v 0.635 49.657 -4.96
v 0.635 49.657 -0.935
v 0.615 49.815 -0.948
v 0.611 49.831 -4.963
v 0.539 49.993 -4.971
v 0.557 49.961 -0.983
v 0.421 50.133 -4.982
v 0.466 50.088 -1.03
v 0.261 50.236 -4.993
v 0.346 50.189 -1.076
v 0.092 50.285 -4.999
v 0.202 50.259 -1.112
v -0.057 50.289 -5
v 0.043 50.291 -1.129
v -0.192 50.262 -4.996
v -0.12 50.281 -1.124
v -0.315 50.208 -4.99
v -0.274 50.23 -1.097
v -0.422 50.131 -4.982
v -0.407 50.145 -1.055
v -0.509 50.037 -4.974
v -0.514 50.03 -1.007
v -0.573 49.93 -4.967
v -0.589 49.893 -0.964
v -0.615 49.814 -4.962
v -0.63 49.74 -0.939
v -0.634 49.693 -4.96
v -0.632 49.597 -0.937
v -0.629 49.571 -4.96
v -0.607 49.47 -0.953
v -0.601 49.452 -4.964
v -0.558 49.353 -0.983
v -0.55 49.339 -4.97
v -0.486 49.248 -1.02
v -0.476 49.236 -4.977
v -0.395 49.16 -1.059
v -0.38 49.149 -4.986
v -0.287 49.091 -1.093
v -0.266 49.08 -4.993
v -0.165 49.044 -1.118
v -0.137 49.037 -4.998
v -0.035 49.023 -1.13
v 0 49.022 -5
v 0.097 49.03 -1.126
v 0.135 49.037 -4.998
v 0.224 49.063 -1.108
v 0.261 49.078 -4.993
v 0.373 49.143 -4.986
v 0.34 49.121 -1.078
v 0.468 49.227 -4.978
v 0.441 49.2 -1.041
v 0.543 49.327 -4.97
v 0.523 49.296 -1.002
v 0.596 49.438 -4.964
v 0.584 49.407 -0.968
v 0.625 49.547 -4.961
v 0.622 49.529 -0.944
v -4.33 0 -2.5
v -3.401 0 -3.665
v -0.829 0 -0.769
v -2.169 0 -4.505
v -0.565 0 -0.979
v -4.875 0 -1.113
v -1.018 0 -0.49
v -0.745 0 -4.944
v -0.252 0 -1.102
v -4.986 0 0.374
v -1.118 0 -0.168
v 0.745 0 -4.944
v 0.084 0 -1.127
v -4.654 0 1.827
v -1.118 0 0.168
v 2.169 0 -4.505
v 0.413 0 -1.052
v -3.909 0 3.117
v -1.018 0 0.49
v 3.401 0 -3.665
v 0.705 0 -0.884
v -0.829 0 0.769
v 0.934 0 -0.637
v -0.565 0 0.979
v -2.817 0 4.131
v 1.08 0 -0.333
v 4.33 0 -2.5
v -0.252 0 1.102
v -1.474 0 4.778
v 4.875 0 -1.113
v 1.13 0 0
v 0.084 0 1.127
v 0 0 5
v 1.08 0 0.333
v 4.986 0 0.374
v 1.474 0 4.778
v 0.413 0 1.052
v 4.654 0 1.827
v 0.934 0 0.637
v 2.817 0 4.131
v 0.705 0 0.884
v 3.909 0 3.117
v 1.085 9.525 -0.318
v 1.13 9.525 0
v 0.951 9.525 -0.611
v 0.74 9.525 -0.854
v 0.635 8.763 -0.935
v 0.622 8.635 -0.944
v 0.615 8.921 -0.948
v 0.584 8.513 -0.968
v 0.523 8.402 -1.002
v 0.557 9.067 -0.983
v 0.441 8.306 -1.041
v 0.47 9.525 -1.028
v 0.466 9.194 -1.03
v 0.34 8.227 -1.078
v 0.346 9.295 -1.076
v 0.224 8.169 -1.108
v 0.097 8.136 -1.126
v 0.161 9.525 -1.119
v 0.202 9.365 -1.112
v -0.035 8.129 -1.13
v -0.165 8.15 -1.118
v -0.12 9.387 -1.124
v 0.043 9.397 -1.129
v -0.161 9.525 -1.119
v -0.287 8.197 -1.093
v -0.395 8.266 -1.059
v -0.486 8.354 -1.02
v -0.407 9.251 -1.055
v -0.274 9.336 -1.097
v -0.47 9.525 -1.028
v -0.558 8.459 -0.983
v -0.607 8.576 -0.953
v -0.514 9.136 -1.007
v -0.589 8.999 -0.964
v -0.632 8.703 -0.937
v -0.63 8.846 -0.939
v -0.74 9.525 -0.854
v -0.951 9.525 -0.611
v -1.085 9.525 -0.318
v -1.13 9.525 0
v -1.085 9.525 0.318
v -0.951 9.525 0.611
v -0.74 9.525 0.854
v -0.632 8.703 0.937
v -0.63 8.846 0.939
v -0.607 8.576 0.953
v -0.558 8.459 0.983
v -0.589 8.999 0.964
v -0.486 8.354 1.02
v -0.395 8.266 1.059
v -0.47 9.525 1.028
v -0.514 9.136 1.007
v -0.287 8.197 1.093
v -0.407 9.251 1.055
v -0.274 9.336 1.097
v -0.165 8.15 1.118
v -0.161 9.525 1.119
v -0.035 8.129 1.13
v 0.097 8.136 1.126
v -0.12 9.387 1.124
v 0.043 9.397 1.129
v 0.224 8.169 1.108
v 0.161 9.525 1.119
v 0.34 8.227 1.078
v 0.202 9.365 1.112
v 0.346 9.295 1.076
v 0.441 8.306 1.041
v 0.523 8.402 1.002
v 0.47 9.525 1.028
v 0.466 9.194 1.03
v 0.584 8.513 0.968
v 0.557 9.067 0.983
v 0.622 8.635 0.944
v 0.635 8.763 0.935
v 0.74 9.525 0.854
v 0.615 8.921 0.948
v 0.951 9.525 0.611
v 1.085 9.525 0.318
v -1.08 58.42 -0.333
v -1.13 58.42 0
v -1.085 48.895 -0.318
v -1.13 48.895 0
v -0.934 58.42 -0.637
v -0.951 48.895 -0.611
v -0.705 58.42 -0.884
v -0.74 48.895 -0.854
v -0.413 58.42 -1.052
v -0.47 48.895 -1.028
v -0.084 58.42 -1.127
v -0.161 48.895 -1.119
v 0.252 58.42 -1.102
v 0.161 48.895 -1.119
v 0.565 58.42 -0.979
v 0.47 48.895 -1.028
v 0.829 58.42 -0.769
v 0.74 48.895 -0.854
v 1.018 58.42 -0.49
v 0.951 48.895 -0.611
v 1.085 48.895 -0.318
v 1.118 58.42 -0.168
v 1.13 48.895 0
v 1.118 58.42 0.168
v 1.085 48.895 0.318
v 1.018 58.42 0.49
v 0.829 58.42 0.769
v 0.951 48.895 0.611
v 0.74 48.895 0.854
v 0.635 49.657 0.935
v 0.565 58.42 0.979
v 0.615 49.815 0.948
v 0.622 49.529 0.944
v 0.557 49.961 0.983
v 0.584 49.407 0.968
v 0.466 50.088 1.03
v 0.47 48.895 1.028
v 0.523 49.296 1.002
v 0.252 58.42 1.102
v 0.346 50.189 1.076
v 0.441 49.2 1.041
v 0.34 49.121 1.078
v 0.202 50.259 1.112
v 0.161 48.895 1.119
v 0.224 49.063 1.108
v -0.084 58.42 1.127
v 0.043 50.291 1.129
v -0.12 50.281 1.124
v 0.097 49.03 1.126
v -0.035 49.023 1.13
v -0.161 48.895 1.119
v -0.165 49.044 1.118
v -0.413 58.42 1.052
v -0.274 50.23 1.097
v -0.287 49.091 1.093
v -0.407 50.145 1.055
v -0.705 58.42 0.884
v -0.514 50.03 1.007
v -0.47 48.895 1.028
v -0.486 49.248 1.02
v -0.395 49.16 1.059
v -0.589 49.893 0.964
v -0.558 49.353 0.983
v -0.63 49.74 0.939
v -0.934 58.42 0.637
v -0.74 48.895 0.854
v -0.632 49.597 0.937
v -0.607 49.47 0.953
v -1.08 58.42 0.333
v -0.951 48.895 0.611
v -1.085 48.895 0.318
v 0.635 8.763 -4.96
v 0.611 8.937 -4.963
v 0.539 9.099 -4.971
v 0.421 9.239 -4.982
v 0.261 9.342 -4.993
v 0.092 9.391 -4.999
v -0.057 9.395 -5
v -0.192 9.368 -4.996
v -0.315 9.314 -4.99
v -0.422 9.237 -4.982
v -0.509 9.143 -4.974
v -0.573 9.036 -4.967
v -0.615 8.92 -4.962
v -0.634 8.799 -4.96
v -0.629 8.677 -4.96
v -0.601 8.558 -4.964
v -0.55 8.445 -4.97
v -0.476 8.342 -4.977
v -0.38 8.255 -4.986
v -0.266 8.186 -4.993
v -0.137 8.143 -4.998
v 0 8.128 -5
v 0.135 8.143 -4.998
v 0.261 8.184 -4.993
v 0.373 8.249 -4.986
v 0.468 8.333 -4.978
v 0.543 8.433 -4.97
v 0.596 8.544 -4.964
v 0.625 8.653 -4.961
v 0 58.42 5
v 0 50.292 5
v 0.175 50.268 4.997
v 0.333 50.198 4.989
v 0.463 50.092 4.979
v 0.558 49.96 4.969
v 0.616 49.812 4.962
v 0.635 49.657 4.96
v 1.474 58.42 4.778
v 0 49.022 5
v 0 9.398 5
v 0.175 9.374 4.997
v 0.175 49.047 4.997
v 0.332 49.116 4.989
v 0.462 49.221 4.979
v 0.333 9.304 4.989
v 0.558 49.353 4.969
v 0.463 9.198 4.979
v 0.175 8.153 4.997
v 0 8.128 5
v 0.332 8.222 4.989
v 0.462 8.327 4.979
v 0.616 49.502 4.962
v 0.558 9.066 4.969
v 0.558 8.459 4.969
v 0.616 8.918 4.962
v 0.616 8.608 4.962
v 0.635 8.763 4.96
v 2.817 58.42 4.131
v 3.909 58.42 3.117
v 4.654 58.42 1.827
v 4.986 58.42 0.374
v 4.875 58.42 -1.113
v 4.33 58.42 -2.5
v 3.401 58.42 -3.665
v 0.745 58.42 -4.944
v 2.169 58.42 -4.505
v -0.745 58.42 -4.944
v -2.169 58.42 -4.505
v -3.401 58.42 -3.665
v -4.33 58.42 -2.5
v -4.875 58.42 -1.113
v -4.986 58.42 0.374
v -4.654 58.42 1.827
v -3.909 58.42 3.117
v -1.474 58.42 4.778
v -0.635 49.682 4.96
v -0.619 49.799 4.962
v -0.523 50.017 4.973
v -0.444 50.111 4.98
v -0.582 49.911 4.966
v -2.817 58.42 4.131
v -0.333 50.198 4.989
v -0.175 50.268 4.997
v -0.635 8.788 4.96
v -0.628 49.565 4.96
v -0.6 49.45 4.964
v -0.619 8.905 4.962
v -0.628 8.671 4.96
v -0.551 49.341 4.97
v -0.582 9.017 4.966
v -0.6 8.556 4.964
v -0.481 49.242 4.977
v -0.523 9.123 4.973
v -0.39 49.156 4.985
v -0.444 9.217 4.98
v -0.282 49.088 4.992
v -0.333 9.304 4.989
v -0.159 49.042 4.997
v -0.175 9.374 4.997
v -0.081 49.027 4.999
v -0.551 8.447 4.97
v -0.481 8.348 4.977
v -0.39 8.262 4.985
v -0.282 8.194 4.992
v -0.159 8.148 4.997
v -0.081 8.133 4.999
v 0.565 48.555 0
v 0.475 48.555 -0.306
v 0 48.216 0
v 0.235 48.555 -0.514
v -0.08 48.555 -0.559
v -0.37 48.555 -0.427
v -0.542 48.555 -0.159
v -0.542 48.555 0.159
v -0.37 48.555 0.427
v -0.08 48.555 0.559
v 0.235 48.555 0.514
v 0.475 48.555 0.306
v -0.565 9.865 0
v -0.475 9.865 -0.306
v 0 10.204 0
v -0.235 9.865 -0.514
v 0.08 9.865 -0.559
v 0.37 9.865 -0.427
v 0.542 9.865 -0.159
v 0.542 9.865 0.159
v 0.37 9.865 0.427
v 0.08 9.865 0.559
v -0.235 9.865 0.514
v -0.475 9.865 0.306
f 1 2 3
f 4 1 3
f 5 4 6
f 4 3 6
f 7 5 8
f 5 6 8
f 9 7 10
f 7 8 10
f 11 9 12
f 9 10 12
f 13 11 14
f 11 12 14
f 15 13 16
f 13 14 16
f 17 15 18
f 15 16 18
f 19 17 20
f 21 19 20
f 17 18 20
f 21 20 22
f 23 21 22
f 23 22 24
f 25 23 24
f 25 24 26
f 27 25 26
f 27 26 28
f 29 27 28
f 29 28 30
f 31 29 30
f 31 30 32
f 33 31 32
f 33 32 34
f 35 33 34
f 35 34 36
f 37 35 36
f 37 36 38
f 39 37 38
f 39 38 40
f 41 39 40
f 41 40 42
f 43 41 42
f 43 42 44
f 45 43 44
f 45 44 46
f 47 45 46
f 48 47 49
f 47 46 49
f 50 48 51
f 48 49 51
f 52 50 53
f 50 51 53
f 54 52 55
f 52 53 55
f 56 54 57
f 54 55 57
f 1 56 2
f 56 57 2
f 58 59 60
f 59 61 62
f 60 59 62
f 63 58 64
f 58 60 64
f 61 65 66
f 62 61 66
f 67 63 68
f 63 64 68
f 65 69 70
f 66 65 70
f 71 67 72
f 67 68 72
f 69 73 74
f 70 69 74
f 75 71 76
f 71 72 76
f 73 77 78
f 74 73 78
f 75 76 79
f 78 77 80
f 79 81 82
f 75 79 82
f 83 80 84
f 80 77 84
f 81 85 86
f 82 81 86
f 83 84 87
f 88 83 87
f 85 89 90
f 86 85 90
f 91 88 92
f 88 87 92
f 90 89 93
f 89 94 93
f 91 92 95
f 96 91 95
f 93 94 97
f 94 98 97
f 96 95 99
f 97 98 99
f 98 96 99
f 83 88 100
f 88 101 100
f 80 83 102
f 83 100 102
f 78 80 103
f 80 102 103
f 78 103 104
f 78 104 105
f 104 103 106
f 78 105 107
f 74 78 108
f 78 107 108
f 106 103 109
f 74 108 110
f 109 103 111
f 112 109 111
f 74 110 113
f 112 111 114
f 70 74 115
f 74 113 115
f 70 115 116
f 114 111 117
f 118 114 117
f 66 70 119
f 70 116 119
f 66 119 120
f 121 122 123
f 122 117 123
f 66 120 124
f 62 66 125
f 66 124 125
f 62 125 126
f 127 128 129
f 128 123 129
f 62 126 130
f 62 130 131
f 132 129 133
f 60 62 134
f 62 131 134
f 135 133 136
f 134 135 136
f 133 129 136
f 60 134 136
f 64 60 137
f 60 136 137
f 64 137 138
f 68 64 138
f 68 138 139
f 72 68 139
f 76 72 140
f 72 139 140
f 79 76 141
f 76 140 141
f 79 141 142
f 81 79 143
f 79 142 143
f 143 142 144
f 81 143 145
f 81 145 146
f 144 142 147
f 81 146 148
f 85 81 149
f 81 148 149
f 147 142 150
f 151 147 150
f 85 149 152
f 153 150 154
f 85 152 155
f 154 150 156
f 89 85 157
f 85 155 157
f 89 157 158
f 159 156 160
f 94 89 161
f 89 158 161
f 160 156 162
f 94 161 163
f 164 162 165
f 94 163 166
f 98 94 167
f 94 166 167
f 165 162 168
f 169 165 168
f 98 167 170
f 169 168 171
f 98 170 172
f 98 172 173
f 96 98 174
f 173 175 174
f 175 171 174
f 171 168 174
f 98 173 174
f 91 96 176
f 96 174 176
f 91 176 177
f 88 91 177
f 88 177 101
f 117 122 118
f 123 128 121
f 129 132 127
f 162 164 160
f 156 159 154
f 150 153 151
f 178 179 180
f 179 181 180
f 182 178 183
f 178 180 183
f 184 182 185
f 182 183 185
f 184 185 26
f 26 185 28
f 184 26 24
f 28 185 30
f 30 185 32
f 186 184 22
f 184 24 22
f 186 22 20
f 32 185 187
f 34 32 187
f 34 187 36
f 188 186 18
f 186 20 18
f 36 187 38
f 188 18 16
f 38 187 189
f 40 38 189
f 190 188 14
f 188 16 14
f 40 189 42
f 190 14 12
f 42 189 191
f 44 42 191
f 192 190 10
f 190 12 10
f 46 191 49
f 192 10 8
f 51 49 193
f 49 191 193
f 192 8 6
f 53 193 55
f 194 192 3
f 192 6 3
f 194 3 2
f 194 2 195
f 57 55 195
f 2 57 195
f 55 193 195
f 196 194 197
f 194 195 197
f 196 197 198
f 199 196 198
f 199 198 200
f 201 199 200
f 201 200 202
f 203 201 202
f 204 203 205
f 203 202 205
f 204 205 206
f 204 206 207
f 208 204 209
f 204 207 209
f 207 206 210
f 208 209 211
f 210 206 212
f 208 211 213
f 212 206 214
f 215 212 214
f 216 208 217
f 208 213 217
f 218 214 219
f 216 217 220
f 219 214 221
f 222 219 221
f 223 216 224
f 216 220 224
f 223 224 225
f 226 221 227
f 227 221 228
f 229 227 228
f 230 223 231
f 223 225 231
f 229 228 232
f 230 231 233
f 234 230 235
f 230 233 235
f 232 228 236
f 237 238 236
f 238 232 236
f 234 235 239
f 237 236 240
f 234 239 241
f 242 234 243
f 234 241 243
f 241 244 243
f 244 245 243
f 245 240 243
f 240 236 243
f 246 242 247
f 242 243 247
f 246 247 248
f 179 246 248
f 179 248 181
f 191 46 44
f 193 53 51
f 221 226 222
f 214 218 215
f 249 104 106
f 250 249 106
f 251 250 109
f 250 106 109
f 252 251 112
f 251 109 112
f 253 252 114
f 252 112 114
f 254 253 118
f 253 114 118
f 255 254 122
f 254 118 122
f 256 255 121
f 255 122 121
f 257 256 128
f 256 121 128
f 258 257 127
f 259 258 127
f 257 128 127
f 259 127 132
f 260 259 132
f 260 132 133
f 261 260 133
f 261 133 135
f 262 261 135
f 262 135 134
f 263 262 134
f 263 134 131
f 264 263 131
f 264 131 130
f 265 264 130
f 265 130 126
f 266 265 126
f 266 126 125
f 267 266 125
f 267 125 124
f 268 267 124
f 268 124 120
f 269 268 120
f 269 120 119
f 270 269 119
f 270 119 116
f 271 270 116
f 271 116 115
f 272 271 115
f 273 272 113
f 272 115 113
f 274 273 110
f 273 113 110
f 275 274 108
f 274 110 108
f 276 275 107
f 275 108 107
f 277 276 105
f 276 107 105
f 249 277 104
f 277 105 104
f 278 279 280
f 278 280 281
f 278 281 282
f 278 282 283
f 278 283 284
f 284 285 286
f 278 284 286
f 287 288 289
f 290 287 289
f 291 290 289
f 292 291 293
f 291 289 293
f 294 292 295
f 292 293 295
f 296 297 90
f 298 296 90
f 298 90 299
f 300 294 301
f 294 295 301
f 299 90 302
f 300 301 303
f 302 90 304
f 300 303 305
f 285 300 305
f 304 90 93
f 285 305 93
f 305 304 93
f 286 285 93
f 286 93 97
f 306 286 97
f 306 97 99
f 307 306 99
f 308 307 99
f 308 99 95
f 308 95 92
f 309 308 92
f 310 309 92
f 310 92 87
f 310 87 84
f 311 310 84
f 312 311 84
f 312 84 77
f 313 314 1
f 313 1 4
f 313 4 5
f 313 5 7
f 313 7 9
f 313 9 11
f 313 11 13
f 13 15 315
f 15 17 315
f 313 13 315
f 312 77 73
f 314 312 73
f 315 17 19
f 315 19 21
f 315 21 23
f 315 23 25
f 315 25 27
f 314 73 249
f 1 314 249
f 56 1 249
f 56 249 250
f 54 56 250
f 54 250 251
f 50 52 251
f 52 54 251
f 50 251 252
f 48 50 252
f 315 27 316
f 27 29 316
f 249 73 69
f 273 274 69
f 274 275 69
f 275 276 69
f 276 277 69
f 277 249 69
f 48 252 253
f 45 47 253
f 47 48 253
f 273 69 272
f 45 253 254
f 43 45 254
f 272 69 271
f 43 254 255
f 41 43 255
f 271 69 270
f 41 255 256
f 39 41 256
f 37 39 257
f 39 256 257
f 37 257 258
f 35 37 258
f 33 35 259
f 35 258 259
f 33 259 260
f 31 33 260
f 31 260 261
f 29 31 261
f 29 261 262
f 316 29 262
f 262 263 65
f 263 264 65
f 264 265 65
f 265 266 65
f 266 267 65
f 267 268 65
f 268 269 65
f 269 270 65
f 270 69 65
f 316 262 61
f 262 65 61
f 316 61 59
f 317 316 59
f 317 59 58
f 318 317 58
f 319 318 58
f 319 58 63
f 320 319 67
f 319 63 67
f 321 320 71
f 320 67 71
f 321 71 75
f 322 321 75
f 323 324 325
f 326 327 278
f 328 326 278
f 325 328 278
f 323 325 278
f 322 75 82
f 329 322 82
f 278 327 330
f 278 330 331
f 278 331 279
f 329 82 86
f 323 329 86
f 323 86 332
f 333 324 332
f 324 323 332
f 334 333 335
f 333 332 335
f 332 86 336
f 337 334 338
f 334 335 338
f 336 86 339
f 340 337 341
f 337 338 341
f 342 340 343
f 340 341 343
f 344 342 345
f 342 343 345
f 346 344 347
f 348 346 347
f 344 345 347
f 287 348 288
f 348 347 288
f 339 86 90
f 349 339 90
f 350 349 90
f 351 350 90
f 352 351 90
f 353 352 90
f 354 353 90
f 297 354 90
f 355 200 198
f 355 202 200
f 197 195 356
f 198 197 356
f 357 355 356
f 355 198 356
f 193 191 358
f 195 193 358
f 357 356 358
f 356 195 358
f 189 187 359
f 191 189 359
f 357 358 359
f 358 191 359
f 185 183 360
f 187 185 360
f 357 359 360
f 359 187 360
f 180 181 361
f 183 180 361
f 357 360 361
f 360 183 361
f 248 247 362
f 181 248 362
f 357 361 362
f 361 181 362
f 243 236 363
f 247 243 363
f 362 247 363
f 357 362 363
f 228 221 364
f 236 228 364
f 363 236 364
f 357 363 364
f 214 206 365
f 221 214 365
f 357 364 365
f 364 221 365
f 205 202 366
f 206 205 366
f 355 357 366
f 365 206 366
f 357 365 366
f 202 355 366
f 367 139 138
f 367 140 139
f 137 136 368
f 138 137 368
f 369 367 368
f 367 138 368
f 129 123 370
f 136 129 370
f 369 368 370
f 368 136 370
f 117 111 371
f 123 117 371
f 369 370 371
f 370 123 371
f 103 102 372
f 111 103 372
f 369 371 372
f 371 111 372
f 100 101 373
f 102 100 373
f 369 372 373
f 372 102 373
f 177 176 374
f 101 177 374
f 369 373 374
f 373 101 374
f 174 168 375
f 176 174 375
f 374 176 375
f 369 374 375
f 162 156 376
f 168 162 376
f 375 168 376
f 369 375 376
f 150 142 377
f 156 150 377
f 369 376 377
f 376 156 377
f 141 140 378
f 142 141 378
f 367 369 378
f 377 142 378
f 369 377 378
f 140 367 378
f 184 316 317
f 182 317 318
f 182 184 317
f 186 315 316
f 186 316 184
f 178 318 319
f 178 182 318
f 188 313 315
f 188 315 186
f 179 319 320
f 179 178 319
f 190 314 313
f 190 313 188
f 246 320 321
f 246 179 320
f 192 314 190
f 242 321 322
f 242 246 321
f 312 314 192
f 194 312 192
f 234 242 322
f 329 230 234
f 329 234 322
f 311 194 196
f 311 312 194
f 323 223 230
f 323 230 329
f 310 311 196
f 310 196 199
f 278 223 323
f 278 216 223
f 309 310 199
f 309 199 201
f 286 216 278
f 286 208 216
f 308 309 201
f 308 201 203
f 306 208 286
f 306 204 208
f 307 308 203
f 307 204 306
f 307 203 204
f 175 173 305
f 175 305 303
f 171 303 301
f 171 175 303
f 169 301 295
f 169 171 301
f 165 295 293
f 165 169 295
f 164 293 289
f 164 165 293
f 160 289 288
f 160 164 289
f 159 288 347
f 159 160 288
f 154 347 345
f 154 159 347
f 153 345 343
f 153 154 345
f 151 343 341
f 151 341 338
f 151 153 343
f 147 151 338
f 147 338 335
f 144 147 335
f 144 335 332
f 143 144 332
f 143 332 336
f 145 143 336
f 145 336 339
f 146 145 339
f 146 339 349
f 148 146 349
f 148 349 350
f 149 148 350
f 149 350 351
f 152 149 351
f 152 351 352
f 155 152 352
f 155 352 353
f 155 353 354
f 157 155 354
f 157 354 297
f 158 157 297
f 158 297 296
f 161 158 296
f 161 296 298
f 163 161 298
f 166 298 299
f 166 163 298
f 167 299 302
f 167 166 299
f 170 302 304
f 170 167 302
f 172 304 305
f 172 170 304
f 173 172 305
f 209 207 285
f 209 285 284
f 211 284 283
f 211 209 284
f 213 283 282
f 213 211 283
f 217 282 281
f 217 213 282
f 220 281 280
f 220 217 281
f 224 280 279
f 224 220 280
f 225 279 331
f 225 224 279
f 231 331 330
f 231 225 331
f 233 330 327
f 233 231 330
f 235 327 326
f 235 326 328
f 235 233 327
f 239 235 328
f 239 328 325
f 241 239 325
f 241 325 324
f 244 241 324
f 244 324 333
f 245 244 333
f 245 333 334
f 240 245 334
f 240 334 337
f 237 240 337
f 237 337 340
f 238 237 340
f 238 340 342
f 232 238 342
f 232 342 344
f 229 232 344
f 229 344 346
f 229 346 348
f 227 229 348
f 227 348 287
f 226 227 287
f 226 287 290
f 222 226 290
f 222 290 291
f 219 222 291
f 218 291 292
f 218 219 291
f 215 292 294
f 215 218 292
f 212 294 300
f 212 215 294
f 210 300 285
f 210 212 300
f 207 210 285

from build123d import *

# Parameters (mm, degrees)
SKETCH1_R                 = 5
BOSS_EXTRUDE1_DEPTH       = 58.42
F_4_40_TAPPED_HOLE1_D     = 2.2606
F_4_40_TAPPED_HOLE1_DEPTH = 9.525
F_4_40_TAPPED_HOLE1_TIP   = 0.679152758
F_4_40_TAPPED_HOLE2_D     = 2.2606
F_4_40_TAPPED_HOLE2_DEPTH = 9.525
F_4_40_TAPPED_HOLE2_TIP   = 0.679152758
SKETCH7_R                 = 0.635
CUT_EXTRUDE1_DEPTH        = 6
CUT_EXTRUDE1_DEPTH_BACK   = 6


with BuildPart() as part:
    # Sketch1 → Boss-Extrude1 (new body)
    with BuildSketch(Plane(origin=(0, 0, 0), x_dir=(1, 0, 0), z_dir=(0, 1, 0))):
        with Locations(Location((0, 0, 0), (0, 0, 270))):  # turned: the seam where the file's is
            Circle(SKETCH1_R)
    extrude(amount=BOSS_EXTRUDE1_DEPTH)

    # #4-40 Tapped Hole1
    with Locations(Plane(origin=(0, 58.42, 0), x_dir=(1, 0, 0), z_dir=(0, 1, 0))):
        with Locations((0, 0)):
            Hole(F_4_40_TAPPED_HOLE1_D / 2, depth=F_4_40_TAPPED_HOLE1_DEPTH)
            with Locations((0, 0, -(F_4_40_TAPPED_HOLE1_DEPTH + F_4_40_TAPPED_HOLE1_TIP / 2))):  # 118° drill point
                Cone(0, F_4_40_TAPPED_HOLE1_D / 2, F_4_40_TAPPED_HOLE1_TIP, mode=Mode.SUBTRACT)

    # #4-40 Tapped Hole2
    with Locations(Plane(origin=(0, 0, 0), x_dir=(-1, 0, 0), z_dir=(0, -1, 0))):
        with Locations((0, 0)):
            Hole(F_4_40_TAPPED_HOLE2_D / 2, depth=F_4_40_TAPPED_HOLE2_DEPTH)
            with Locations((0, 0, -(F_4_40_TAPPED_HOLE2_DEPTH + F_4_40_TAPPED_HOLE2_TIP / 2))):  # 118° drill point
                Cone(0, F_4_40_TAPPED_HOLE2_D / 2, F_4_40_TAPPED_HOLE2_TIP, mode=Mode.SUBTRACT)

    # Sketch7 → Cut-Extrude1 (cut, two sides)
    with BuildSketch(Plane.XY) as cut_extrude1_sk:
        with Locations((0, 49.657)):
            Circle(SKETCH7_R)
        with Locations((0, 8.763)):
            Circle(SKETCH7_R)
    extrude(amount=CUT_EXTRUDE1_DEPTH, mode=Mode.SUBTRACT)
    extrude(cut_extrude1_sk.sketch, amount=-CUT_EXTRUDE1_DEPTH_BACK, mode=Mode.SUBTRACT)


solid = part.part
